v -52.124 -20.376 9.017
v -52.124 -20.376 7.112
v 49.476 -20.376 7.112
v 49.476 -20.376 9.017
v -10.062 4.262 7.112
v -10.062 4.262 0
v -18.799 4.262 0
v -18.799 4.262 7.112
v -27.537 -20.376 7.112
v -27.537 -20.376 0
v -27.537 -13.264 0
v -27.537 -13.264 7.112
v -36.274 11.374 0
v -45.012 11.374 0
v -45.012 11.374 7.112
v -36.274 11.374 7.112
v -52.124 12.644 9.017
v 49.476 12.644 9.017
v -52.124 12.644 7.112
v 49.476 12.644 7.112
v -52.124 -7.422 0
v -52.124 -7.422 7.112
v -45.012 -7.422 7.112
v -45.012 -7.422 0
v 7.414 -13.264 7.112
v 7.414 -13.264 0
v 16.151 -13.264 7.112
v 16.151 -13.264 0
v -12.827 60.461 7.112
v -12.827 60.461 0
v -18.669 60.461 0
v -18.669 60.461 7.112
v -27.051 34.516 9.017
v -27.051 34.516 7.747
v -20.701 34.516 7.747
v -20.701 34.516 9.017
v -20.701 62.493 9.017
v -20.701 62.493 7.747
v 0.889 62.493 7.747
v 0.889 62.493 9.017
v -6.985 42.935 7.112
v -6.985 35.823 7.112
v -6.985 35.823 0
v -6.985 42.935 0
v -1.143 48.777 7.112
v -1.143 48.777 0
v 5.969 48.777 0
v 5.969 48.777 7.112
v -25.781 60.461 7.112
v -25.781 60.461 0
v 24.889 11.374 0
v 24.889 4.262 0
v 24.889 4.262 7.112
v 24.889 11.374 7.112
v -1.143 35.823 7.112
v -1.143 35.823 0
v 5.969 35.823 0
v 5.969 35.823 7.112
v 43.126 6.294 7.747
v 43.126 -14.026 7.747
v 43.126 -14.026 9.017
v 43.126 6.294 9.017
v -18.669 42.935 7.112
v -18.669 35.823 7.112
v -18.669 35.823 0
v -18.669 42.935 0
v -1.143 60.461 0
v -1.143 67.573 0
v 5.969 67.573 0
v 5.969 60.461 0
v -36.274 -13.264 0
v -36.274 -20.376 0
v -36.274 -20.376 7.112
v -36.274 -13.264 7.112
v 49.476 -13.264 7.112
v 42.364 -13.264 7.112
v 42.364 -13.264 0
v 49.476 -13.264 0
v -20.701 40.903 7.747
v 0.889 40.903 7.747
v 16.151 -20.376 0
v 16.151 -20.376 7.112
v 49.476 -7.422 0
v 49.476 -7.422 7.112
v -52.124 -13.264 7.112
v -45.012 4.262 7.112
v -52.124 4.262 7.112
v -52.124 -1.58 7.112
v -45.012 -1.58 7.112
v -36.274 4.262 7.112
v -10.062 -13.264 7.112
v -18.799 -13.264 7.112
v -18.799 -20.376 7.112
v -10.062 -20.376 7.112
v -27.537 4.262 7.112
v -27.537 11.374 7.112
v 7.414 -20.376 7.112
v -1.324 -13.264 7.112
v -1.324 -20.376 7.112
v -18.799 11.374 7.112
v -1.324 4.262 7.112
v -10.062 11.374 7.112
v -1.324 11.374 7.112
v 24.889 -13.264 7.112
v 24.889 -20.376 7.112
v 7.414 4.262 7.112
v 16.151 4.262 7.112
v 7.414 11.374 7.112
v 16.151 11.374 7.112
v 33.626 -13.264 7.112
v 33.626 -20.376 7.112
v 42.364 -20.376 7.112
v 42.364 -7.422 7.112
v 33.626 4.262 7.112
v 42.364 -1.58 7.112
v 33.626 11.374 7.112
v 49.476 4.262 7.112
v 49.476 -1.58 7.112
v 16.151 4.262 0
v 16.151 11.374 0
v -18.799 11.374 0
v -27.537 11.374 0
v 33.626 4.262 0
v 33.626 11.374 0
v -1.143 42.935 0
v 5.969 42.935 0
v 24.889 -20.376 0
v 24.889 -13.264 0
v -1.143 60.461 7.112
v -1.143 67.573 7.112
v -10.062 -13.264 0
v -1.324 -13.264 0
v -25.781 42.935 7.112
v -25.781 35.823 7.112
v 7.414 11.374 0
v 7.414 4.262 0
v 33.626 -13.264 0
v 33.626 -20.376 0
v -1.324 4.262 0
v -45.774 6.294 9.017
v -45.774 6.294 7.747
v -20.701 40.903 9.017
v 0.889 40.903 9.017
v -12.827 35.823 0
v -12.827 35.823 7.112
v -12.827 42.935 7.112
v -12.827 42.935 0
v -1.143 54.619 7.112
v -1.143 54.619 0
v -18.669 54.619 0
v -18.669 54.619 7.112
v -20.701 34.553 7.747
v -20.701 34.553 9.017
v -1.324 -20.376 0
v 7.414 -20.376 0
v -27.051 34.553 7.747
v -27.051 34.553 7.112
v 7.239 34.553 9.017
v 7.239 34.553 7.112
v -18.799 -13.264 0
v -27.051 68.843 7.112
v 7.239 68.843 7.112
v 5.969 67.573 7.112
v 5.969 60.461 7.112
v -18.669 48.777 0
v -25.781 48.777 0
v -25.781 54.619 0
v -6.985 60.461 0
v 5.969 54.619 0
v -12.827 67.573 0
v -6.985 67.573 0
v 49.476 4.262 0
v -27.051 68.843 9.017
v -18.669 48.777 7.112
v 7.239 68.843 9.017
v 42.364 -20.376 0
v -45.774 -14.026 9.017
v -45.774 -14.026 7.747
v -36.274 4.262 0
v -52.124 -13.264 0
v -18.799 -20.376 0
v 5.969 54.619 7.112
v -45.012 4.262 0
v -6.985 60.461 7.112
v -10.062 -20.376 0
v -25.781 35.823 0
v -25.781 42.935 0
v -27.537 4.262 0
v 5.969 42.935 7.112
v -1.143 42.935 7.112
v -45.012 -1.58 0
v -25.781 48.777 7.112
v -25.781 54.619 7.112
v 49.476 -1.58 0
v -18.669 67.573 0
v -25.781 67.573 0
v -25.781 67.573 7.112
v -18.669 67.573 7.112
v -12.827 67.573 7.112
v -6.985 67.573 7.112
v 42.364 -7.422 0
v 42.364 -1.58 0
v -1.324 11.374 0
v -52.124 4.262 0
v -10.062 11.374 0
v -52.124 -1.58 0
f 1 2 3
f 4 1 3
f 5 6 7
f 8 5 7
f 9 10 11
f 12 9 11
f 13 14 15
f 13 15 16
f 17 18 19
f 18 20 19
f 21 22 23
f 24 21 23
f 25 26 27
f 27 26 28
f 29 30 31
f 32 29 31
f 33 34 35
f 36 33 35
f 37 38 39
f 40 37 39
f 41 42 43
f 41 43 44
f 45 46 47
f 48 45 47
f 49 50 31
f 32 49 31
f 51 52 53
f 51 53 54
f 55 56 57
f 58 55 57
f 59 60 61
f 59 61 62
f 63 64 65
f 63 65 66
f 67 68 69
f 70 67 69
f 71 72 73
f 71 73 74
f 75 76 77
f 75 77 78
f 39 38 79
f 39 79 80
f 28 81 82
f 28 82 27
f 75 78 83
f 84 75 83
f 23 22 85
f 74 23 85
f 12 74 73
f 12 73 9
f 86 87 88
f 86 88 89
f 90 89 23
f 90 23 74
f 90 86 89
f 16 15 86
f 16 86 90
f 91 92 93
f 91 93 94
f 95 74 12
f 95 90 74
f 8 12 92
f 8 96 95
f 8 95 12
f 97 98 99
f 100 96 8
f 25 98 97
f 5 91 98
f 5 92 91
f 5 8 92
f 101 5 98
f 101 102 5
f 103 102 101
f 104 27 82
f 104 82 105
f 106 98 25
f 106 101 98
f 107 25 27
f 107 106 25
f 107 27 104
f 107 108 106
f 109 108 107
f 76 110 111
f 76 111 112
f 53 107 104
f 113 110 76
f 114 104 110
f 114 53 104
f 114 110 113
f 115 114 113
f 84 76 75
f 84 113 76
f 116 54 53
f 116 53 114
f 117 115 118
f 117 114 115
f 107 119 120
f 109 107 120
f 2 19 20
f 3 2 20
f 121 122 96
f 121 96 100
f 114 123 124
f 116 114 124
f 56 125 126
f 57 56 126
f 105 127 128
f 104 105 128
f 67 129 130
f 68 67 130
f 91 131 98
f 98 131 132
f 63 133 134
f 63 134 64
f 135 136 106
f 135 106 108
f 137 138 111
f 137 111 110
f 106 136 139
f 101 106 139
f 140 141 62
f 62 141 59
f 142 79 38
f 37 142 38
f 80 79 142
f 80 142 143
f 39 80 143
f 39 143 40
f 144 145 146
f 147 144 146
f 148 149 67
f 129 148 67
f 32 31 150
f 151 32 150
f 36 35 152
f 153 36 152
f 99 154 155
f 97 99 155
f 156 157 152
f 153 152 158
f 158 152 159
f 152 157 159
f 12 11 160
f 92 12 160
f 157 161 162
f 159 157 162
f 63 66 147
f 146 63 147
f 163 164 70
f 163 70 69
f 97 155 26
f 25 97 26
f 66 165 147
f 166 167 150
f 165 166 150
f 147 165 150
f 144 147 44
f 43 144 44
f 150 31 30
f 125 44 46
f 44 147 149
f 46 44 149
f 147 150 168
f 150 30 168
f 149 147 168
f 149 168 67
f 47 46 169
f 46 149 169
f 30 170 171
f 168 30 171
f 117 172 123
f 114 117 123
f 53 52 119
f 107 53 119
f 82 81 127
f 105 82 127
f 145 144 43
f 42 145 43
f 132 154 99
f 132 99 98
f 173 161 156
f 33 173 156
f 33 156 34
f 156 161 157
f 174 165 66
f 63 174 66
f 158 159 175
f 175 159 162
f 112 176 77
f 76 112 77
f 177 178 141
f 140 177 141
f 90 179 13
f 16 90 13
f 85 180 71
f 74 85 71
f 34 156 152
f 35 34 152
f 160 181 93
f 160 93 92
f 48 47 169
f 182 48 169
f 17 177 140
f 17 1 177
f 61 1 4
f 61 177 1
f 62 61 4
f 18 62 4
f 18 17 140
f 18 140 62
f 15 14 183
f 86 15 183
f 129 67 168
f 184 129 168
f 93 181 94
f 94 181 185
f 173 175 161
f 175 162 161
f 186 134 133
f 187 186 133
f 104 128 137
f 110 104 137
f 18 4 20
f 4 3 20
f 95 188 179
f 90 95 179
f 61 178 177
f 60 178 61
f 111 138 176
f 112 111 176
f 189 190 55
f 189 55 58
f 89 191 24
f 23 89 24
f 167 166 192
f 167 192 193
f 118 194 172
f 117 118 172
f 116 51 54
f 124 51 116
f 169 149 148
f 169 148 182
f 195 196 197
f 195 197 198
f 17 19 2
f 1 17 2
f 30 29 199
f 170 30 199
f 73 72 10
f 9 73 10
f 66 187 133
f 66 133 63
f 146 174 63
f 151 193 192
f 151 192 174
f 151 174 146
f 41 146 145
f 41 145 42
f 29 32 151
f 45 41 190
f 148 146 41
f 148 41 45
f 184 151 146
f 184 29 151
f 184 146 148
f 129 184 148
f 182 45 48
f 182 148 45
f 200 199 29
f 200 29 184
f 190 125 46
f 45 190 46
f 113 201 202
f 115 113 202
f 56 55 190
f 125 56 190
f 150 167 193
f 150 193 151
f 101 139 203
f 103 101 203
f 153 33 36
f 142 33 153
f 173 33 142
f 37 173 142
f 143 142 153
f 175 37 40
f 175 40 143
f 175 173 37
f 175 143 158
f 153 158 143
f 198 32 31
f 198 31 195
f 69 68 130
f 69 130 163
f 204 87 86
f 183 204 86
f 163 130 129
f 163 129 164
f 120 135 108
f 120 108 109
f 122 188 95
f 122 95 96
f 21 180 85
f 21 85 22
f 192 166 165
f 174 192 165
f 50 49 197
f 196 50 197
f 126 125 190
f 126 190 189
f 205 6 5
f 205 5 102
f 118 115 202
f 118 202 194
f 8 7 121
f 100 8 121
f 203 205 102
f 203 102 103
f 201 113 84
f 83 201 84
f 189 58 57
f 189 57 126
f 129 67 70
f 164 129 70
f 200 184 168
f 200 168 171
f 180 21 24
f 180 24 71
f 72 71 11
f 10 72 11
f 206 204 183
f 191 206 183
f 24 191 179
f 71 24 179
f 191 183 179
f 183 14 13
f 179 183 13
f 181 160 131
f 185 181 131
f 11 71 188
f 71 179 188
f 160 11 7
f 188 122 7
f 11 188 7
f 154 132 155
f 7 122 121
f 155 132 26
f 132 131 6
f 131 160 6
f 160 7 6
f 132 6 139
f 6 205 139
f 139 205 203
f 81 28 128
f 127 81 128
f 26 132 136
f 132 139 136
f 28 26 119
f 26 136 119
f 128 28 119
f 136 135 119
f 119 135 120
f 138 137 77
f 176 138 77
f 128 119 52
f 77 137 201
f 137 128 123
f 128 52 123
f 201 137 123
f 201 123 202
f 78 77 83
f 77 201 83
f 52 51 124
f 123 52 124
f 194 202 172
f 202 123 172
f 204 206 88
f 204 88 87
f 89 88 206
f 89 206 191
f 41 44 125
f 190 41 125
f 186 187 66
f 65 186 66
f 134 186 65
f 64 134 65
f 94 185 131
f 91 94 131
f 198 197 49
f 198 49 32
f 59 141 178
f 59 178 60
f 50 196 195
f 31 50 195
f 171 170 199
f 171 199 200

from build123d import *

# Parameters (mm, degrees)
F0_W      = 8.7376
F0_H      = 7.112
F0_W_2    = 7.112
F0_H_2    = 5.842
F1_DEPTH  = 7.112
F2_W      = 7.112
F2_H      = 7.112
F2_W_2    = 87.376
F2_H_2    = 17.526
F2_H_3    = 8.382
F3_DEPTH  = 0.635
F4_W      = 7.112
F4_H      = 7.112
F5_DEPTH  = 7.112
F4_W_2    = 5.842
F4_H_2    = 5.842
F6_W      = 8.382
F6_H      = 8.382
F6_W_2    = 17.526
F6_H_2    = 17.526
F7_DEPTH  = 0.635
F8_W      = 6.35
F8_H      = 6.35
F8_W_2    = 88.9
F8_H_2    = 20.32
F9_DEPTH  = 1.27
F10_W     = 6.35
F10_H     = 6.35
F10_W_2   = 21.59
F10_H_2   = 21.59
F10_H_3   = 0.0370688408
F11_DEPTH = 1.27


with BuildPart() as f1:
    # F0 (on Top) → F1 (new body)
    with BuildSketch(Plane.XY):
        Polygon((-36.2743366156, 4.2619839477), (-45.0119366156, 4.2619839477), (-45.0119366156, -1.5800160523), (-45.0119366156, -7.4220160523), (-45.0119366156, -13.2640160523), (-36.2743366156, -13.2640160523), (-27.5367366156, -13.2640160523), (-18.7991366156, -13.2640160523), (-10.0615366156, -13.2640160523), (-1.3239366156, -13.2640160523), (7.4136633844, -13.2640160523), (16.1512633844, -13.2640160523), (24.8888633844, -13.2640160523), (33.6264633844, -13.2640160523), (42.3640633844, -13.2640160523), (42.3640633844, -7.4220160523), (42.3640633844, -1.5800160523), (42.3640633844, 4.2619839477), (33.6264633844, 4.2619839477), (24.8888633844, 4.2619839477), (16.1512633844, 4.2619839477), (7.4136633844, 4.2619839477), (-1.3239366156, 4.2619839477), (-10.0615366156, 4.2619839477), (-18.7991366156, 4.2619839477), (-27.5367366156, 4.2619839477), align=None)
        with Locations((-40.6431366156, 7.8179839477)):
            Rectangle(F0_W, F0_H)
        with Locations((-23.1679366156, 7.8179839477)):
            Rectangle(F0_W, F0_H)
        with Locations((-5.6927366156, 7.8179839477)):
            Rectangle(F0_W, F0_H)
        with Locations((11.7824633844, 7.8179839477)):
            Rectangle(F0_W, F0_H)
        with Locations((29.2576633844, 7.8179839477)):
            Rectangle(F0_W, F0_H)
        with Locations((45.9200633844, 1.3409839477)):
            Rectangle(F0_W_2, F0_H_2)
        with Locations((45.9200633844, -10.3430160523)):
            Rectangle(F0_W_2, F0_H_2)
        with Locations((37.9952633844, -16.8200160523)):
            Rectangle(F0_W, F0_H)
        with Locations((20.5200633844, -16.8200160523)):
            Rectangle(F0_W, F0_H)
        with Locations((3.0448633844, -16.8200160523)):
            Rectangle(F0_W, F0_H)
        with Locations((-14.4303366156, -16.8200160523)):
            Rectangle(F0_W, F0_H)
        with Locations((-31.9055366156, -16.8200160523)):
            Rectangle(F0_W, F0_H)
        with Locations((-48.5679366156, -10.3430160523)):
            Rectangle(F0_W_2, F0_H_2)
        with Locations((-48.5679366156, 1.3409839477)):
            Rectangle(F0_W_2, F0_H_2)
    extrude(amount=F1_DEPTH)


with BuildPart() as f3:
    # F2 (on face) → F3 (new body)
    with BuildSketch(Plane.XY.offset(7.112)):
        with Locations((-48.5679366156, -16.8200160523)):
            Rectangle(F2_W, F2_H)
        with Locations((-1.3239366156, -16.8200160523)):
            Rectangle(F2_W_2, F2_H)
        with Locations((-48.5679366156, -4.5010160523)):
            Rectangle(F2_W, F2_H_2)
        with Locations((45.9200633844, -16.8200160523)):
            Rectangle(F2_W, F2_H)
        with Locations((-48.5679366156, 8.4529839477)):
            Rectangle(F2_W, F2_H_3)
        with Locations((-1.3239366156, 8.4529839477)):
            Rectangle(F2_W_2, F2_H_3)
        with Locations((45.9200633844, -4.5010160523)):
            Rectangle(F2_W, F2_H_2)
        with Locations((45.9200633844, 8.4529839477)):
            Rectangle(F2_W, F2_H_3)
        Polygon((-45.0119366156, -7.4220160523), (-45.0119366156, -13.2640160523), (-36.2743366156, -13.2640160523), (-27.5367366156, -13.2640160523), (-18.7991366156, -13.2640160523), (-10.0615366156, -13.2640160523), (-1.3239366156, -13.2640160523), (7.4136633844, -13.2640160523), (16.1512633844, -13.2640160523), (24.8888633844, -13.2640160523), (33.6264633844, -13.2640160523), (42.3640633844, -13.2640160523), (42.3640633844, -7.4220160523), (42.3640633844, -1.5800160523), (42.3640633844, 4.2619839477), (33.6264633844, 4.2619839477), (24.8888633844, 4.2619839477), (16.1512633844, 4.2619839477), (7.4136633844, 4.2619839477), (-1.3239366156, 4.2619839477), (-10.0615366156, 4.2619839477), (-18.7991366156, 4.2619839477), (-27.5367366156, 4.2619839477), (-36.2743366156, 4.2619839477), (-45.0119366156, 4.2619839477), (-45.0119366156, -1.5800160523), align=None)
    extrude(amount=F3_DEPTH)

    # F8 (on face) → F9 (join)
    with BuildSketch(Plane.XY.offset(7.747)):
        with Locations((-48.9489366156, 9.4689839477)):
            Rectangle(F8_W, F8_H)
        with Locations((-1.3239366156, 9.4689839477)):
            Rectangle(F8_W_2, F8_H)
        with Locations((-48.9489366156, -3.8660160523)):
            Rectangle(F8_W, F8_H_2)
        with Locations((46.3010633844, 9.4689839477)):
            Rectangle(F8_W, F8_H)
        with Locations((-48.9489366156, -17.2010160523)):
            Rectangle(F8_W, F8_H)
        with Locations((46.3010633844, -3.8660160523)):
            Rectangle(F8_W, F8_H_2)
        with Locations((-1.3239366156, -17.2010160523)):
            Rectangle(F8_W_2, F8_H)
        with Locations((46.3010633844, -17.2010160523)):
            Rectangle(F8_W, F8_H)
    extrude(amount=F9_DEPTH)


with BuildPart() as f5:
    # F4 (on Top) → F5 (new body)
    with BuildSketch(Plane.XY):
        with Locations((-22.2249995264, 64.0173197334)):
            Rectangle(F4_W, F4_H)
    extrude(amount=F5_DEPTH)


with BuildPart() as f5b:
    # F4 (on Top) → F5, piece 2 (new body)
    with BuildSketch(Plane.XY):
        with Locations((-9.9059995264, 64.0173197334)):
            Rectangle(F4_W_2, F4_H)
        Polygon((-12.8269995264, 60.4613197334), (-18.6689995264, 60.4613197334), (-18.6689995264, 54.6193197334), (-18.6689995264, 48.7773197334), (-18.6689995264, 42.9353197334), (-12.8269995264, 42.9353197334), (-6.9849995264, 42.9353197334), (-1.1429995264, 42.9353197334), (-1.1429995264, 48.7773197334), (-1.1429995264, 54.6193197334), (-1.1429995264, 60.4613197334), (-6.9849995264, 60.4613197334), align=None)
        with Locations((2.4130004736, 51.6983197334)):
            Rectangle(F4_W, F4_H_2)
        with Locations((-9.9059995264, 39.3793197334)):
            Rectangle(F4_W_2, F4_H)
        with Locations((-22.2249995264, 51.6983197334)):
            Rectangle(F4_W, F4_H_2)
    extrude(amount=F5_DEPTH)


with BuildPart() as f5c:
    # F4 (on Top) → F5, piece 3 (new body)
    with BuildSketch(Plane.XY):
        with Locations((2.4130004736, 64.0173197334)):
            Rectangle(F4_W, F4_H)
    extrude(amount=F5_DEPTH)


with BuildPart() as f5d:
    # F4 (on Top) → F5, piece 4 (new body)
    with BuildSketch(Plane.XY):
        with Locations((2.4130004736, 39.3793197334)):
            Rectangle(F4_W, F4_H)
    extrude(amount=F5_DEPTH)


with BuildPart() as f5e:
    # F4 (on Top) → F5, piece 5 (new body)
    with BuildSketch(Plane.XY):
        with Locations((-22.2249995264, 39.3793197334)):
            Rectangle(F4_W, F4_H)
    extrude(amount=F5_DEPTH)


with BuildPart() as f7:
    # F6 (on face) → F7 (new body)
    with BuildSketch(Plane.XY.offset(7.112)):
        with Locations((-22.8599995264, 38.7443197334)):
            Rectangle(F6_W, F6_H)
        with Locations((-9.9059995264, 38.7443197334)):
            Rectangle(F6_W_2, F6_H)
        with Locations((-22.8599995264, 51.6983197334)):
            Rectangle(F6_W, F6_H_2)
        with Locations((3.0480004736, 38.7443197334)):
            Rectangle(F6_W, F6_H)
        with Locations((-22.8599995264, 64.6523197334)):
            Rectangle(F6_W, F6_H)
        with Locations((-9.9059995264, 64.6523197334)):
            Rectangle(F6_W_2, F6_H)
        with Locations((3.0480004736, 51.6983197334)):
            Rectangle(F6_W, F6_H_2)
        with Locations((3.0480004736, 64.6523197334)):
            Rectangle(F6_W, F6_H)
        Polygon((-18.6689995264, 48.7773197334), (-18.6689995264, 42.9353197334), (-12.8269995264, 42.9353197334), (-6.9849995264, 42.9353197334), (-1.1429995264, 42.9353197334), (-1.1429995264, 48.7773197334), (-1.1429995264, 54.6193197334), (-1.1429995264, 60.4613197334), (-6.9849995264, 60.4613197334), (-12.8269995264, 60.4613197334), (-18.6689995264, 60.4613197334), (-18.6689995264, 54.6193197334), align=None)
    extrude(amount=F7_DEPTH)

    # F10 (on face) → F11 (join)
    with BuildSketch(Plane.XY.offset(7.747)):
        with Locations((-23.8759995264, 65.6683197334)):
            Rectangle(F10_W, F10_H)
        with Locations((-9.9059995264, 65.6683197334)):
            Rectangle(F10_W_2, F10_H)
        with Locations((-23.8759995264, 51.6983197334)):
            Rectangle(F10_W, F10_H_2)
        with Locations((4.0640004736, 65.6683197334)):
            Rectangle(F10_W, F10_H)
        with Locations((-23.8759995264, 37.7283197334)):
            Rectangle(F10_W, F10_H)
        with Locations((4.0640004736, 51.6983197334)):
            Rectangle(F10_W, F10_H_2)
        with Locations((-9.9059995264, 37.7283197334)):
            Rectangle(F10_W_2, F10_H)
        with Locations((-23.8759995264, 34.534785313)):
            Rectangle(F10_W, F10_H_3)
        with Locations((4.0640004736, 37.7283197334)):
            Rectangle(F10_W, F10_H)
    extrude(amount=F11_DEPTH)


solid = Compound([f1.part, f3.part, f5.part, f5b.part, f5c.part, f5d.part, f5e.part, f7.part])
